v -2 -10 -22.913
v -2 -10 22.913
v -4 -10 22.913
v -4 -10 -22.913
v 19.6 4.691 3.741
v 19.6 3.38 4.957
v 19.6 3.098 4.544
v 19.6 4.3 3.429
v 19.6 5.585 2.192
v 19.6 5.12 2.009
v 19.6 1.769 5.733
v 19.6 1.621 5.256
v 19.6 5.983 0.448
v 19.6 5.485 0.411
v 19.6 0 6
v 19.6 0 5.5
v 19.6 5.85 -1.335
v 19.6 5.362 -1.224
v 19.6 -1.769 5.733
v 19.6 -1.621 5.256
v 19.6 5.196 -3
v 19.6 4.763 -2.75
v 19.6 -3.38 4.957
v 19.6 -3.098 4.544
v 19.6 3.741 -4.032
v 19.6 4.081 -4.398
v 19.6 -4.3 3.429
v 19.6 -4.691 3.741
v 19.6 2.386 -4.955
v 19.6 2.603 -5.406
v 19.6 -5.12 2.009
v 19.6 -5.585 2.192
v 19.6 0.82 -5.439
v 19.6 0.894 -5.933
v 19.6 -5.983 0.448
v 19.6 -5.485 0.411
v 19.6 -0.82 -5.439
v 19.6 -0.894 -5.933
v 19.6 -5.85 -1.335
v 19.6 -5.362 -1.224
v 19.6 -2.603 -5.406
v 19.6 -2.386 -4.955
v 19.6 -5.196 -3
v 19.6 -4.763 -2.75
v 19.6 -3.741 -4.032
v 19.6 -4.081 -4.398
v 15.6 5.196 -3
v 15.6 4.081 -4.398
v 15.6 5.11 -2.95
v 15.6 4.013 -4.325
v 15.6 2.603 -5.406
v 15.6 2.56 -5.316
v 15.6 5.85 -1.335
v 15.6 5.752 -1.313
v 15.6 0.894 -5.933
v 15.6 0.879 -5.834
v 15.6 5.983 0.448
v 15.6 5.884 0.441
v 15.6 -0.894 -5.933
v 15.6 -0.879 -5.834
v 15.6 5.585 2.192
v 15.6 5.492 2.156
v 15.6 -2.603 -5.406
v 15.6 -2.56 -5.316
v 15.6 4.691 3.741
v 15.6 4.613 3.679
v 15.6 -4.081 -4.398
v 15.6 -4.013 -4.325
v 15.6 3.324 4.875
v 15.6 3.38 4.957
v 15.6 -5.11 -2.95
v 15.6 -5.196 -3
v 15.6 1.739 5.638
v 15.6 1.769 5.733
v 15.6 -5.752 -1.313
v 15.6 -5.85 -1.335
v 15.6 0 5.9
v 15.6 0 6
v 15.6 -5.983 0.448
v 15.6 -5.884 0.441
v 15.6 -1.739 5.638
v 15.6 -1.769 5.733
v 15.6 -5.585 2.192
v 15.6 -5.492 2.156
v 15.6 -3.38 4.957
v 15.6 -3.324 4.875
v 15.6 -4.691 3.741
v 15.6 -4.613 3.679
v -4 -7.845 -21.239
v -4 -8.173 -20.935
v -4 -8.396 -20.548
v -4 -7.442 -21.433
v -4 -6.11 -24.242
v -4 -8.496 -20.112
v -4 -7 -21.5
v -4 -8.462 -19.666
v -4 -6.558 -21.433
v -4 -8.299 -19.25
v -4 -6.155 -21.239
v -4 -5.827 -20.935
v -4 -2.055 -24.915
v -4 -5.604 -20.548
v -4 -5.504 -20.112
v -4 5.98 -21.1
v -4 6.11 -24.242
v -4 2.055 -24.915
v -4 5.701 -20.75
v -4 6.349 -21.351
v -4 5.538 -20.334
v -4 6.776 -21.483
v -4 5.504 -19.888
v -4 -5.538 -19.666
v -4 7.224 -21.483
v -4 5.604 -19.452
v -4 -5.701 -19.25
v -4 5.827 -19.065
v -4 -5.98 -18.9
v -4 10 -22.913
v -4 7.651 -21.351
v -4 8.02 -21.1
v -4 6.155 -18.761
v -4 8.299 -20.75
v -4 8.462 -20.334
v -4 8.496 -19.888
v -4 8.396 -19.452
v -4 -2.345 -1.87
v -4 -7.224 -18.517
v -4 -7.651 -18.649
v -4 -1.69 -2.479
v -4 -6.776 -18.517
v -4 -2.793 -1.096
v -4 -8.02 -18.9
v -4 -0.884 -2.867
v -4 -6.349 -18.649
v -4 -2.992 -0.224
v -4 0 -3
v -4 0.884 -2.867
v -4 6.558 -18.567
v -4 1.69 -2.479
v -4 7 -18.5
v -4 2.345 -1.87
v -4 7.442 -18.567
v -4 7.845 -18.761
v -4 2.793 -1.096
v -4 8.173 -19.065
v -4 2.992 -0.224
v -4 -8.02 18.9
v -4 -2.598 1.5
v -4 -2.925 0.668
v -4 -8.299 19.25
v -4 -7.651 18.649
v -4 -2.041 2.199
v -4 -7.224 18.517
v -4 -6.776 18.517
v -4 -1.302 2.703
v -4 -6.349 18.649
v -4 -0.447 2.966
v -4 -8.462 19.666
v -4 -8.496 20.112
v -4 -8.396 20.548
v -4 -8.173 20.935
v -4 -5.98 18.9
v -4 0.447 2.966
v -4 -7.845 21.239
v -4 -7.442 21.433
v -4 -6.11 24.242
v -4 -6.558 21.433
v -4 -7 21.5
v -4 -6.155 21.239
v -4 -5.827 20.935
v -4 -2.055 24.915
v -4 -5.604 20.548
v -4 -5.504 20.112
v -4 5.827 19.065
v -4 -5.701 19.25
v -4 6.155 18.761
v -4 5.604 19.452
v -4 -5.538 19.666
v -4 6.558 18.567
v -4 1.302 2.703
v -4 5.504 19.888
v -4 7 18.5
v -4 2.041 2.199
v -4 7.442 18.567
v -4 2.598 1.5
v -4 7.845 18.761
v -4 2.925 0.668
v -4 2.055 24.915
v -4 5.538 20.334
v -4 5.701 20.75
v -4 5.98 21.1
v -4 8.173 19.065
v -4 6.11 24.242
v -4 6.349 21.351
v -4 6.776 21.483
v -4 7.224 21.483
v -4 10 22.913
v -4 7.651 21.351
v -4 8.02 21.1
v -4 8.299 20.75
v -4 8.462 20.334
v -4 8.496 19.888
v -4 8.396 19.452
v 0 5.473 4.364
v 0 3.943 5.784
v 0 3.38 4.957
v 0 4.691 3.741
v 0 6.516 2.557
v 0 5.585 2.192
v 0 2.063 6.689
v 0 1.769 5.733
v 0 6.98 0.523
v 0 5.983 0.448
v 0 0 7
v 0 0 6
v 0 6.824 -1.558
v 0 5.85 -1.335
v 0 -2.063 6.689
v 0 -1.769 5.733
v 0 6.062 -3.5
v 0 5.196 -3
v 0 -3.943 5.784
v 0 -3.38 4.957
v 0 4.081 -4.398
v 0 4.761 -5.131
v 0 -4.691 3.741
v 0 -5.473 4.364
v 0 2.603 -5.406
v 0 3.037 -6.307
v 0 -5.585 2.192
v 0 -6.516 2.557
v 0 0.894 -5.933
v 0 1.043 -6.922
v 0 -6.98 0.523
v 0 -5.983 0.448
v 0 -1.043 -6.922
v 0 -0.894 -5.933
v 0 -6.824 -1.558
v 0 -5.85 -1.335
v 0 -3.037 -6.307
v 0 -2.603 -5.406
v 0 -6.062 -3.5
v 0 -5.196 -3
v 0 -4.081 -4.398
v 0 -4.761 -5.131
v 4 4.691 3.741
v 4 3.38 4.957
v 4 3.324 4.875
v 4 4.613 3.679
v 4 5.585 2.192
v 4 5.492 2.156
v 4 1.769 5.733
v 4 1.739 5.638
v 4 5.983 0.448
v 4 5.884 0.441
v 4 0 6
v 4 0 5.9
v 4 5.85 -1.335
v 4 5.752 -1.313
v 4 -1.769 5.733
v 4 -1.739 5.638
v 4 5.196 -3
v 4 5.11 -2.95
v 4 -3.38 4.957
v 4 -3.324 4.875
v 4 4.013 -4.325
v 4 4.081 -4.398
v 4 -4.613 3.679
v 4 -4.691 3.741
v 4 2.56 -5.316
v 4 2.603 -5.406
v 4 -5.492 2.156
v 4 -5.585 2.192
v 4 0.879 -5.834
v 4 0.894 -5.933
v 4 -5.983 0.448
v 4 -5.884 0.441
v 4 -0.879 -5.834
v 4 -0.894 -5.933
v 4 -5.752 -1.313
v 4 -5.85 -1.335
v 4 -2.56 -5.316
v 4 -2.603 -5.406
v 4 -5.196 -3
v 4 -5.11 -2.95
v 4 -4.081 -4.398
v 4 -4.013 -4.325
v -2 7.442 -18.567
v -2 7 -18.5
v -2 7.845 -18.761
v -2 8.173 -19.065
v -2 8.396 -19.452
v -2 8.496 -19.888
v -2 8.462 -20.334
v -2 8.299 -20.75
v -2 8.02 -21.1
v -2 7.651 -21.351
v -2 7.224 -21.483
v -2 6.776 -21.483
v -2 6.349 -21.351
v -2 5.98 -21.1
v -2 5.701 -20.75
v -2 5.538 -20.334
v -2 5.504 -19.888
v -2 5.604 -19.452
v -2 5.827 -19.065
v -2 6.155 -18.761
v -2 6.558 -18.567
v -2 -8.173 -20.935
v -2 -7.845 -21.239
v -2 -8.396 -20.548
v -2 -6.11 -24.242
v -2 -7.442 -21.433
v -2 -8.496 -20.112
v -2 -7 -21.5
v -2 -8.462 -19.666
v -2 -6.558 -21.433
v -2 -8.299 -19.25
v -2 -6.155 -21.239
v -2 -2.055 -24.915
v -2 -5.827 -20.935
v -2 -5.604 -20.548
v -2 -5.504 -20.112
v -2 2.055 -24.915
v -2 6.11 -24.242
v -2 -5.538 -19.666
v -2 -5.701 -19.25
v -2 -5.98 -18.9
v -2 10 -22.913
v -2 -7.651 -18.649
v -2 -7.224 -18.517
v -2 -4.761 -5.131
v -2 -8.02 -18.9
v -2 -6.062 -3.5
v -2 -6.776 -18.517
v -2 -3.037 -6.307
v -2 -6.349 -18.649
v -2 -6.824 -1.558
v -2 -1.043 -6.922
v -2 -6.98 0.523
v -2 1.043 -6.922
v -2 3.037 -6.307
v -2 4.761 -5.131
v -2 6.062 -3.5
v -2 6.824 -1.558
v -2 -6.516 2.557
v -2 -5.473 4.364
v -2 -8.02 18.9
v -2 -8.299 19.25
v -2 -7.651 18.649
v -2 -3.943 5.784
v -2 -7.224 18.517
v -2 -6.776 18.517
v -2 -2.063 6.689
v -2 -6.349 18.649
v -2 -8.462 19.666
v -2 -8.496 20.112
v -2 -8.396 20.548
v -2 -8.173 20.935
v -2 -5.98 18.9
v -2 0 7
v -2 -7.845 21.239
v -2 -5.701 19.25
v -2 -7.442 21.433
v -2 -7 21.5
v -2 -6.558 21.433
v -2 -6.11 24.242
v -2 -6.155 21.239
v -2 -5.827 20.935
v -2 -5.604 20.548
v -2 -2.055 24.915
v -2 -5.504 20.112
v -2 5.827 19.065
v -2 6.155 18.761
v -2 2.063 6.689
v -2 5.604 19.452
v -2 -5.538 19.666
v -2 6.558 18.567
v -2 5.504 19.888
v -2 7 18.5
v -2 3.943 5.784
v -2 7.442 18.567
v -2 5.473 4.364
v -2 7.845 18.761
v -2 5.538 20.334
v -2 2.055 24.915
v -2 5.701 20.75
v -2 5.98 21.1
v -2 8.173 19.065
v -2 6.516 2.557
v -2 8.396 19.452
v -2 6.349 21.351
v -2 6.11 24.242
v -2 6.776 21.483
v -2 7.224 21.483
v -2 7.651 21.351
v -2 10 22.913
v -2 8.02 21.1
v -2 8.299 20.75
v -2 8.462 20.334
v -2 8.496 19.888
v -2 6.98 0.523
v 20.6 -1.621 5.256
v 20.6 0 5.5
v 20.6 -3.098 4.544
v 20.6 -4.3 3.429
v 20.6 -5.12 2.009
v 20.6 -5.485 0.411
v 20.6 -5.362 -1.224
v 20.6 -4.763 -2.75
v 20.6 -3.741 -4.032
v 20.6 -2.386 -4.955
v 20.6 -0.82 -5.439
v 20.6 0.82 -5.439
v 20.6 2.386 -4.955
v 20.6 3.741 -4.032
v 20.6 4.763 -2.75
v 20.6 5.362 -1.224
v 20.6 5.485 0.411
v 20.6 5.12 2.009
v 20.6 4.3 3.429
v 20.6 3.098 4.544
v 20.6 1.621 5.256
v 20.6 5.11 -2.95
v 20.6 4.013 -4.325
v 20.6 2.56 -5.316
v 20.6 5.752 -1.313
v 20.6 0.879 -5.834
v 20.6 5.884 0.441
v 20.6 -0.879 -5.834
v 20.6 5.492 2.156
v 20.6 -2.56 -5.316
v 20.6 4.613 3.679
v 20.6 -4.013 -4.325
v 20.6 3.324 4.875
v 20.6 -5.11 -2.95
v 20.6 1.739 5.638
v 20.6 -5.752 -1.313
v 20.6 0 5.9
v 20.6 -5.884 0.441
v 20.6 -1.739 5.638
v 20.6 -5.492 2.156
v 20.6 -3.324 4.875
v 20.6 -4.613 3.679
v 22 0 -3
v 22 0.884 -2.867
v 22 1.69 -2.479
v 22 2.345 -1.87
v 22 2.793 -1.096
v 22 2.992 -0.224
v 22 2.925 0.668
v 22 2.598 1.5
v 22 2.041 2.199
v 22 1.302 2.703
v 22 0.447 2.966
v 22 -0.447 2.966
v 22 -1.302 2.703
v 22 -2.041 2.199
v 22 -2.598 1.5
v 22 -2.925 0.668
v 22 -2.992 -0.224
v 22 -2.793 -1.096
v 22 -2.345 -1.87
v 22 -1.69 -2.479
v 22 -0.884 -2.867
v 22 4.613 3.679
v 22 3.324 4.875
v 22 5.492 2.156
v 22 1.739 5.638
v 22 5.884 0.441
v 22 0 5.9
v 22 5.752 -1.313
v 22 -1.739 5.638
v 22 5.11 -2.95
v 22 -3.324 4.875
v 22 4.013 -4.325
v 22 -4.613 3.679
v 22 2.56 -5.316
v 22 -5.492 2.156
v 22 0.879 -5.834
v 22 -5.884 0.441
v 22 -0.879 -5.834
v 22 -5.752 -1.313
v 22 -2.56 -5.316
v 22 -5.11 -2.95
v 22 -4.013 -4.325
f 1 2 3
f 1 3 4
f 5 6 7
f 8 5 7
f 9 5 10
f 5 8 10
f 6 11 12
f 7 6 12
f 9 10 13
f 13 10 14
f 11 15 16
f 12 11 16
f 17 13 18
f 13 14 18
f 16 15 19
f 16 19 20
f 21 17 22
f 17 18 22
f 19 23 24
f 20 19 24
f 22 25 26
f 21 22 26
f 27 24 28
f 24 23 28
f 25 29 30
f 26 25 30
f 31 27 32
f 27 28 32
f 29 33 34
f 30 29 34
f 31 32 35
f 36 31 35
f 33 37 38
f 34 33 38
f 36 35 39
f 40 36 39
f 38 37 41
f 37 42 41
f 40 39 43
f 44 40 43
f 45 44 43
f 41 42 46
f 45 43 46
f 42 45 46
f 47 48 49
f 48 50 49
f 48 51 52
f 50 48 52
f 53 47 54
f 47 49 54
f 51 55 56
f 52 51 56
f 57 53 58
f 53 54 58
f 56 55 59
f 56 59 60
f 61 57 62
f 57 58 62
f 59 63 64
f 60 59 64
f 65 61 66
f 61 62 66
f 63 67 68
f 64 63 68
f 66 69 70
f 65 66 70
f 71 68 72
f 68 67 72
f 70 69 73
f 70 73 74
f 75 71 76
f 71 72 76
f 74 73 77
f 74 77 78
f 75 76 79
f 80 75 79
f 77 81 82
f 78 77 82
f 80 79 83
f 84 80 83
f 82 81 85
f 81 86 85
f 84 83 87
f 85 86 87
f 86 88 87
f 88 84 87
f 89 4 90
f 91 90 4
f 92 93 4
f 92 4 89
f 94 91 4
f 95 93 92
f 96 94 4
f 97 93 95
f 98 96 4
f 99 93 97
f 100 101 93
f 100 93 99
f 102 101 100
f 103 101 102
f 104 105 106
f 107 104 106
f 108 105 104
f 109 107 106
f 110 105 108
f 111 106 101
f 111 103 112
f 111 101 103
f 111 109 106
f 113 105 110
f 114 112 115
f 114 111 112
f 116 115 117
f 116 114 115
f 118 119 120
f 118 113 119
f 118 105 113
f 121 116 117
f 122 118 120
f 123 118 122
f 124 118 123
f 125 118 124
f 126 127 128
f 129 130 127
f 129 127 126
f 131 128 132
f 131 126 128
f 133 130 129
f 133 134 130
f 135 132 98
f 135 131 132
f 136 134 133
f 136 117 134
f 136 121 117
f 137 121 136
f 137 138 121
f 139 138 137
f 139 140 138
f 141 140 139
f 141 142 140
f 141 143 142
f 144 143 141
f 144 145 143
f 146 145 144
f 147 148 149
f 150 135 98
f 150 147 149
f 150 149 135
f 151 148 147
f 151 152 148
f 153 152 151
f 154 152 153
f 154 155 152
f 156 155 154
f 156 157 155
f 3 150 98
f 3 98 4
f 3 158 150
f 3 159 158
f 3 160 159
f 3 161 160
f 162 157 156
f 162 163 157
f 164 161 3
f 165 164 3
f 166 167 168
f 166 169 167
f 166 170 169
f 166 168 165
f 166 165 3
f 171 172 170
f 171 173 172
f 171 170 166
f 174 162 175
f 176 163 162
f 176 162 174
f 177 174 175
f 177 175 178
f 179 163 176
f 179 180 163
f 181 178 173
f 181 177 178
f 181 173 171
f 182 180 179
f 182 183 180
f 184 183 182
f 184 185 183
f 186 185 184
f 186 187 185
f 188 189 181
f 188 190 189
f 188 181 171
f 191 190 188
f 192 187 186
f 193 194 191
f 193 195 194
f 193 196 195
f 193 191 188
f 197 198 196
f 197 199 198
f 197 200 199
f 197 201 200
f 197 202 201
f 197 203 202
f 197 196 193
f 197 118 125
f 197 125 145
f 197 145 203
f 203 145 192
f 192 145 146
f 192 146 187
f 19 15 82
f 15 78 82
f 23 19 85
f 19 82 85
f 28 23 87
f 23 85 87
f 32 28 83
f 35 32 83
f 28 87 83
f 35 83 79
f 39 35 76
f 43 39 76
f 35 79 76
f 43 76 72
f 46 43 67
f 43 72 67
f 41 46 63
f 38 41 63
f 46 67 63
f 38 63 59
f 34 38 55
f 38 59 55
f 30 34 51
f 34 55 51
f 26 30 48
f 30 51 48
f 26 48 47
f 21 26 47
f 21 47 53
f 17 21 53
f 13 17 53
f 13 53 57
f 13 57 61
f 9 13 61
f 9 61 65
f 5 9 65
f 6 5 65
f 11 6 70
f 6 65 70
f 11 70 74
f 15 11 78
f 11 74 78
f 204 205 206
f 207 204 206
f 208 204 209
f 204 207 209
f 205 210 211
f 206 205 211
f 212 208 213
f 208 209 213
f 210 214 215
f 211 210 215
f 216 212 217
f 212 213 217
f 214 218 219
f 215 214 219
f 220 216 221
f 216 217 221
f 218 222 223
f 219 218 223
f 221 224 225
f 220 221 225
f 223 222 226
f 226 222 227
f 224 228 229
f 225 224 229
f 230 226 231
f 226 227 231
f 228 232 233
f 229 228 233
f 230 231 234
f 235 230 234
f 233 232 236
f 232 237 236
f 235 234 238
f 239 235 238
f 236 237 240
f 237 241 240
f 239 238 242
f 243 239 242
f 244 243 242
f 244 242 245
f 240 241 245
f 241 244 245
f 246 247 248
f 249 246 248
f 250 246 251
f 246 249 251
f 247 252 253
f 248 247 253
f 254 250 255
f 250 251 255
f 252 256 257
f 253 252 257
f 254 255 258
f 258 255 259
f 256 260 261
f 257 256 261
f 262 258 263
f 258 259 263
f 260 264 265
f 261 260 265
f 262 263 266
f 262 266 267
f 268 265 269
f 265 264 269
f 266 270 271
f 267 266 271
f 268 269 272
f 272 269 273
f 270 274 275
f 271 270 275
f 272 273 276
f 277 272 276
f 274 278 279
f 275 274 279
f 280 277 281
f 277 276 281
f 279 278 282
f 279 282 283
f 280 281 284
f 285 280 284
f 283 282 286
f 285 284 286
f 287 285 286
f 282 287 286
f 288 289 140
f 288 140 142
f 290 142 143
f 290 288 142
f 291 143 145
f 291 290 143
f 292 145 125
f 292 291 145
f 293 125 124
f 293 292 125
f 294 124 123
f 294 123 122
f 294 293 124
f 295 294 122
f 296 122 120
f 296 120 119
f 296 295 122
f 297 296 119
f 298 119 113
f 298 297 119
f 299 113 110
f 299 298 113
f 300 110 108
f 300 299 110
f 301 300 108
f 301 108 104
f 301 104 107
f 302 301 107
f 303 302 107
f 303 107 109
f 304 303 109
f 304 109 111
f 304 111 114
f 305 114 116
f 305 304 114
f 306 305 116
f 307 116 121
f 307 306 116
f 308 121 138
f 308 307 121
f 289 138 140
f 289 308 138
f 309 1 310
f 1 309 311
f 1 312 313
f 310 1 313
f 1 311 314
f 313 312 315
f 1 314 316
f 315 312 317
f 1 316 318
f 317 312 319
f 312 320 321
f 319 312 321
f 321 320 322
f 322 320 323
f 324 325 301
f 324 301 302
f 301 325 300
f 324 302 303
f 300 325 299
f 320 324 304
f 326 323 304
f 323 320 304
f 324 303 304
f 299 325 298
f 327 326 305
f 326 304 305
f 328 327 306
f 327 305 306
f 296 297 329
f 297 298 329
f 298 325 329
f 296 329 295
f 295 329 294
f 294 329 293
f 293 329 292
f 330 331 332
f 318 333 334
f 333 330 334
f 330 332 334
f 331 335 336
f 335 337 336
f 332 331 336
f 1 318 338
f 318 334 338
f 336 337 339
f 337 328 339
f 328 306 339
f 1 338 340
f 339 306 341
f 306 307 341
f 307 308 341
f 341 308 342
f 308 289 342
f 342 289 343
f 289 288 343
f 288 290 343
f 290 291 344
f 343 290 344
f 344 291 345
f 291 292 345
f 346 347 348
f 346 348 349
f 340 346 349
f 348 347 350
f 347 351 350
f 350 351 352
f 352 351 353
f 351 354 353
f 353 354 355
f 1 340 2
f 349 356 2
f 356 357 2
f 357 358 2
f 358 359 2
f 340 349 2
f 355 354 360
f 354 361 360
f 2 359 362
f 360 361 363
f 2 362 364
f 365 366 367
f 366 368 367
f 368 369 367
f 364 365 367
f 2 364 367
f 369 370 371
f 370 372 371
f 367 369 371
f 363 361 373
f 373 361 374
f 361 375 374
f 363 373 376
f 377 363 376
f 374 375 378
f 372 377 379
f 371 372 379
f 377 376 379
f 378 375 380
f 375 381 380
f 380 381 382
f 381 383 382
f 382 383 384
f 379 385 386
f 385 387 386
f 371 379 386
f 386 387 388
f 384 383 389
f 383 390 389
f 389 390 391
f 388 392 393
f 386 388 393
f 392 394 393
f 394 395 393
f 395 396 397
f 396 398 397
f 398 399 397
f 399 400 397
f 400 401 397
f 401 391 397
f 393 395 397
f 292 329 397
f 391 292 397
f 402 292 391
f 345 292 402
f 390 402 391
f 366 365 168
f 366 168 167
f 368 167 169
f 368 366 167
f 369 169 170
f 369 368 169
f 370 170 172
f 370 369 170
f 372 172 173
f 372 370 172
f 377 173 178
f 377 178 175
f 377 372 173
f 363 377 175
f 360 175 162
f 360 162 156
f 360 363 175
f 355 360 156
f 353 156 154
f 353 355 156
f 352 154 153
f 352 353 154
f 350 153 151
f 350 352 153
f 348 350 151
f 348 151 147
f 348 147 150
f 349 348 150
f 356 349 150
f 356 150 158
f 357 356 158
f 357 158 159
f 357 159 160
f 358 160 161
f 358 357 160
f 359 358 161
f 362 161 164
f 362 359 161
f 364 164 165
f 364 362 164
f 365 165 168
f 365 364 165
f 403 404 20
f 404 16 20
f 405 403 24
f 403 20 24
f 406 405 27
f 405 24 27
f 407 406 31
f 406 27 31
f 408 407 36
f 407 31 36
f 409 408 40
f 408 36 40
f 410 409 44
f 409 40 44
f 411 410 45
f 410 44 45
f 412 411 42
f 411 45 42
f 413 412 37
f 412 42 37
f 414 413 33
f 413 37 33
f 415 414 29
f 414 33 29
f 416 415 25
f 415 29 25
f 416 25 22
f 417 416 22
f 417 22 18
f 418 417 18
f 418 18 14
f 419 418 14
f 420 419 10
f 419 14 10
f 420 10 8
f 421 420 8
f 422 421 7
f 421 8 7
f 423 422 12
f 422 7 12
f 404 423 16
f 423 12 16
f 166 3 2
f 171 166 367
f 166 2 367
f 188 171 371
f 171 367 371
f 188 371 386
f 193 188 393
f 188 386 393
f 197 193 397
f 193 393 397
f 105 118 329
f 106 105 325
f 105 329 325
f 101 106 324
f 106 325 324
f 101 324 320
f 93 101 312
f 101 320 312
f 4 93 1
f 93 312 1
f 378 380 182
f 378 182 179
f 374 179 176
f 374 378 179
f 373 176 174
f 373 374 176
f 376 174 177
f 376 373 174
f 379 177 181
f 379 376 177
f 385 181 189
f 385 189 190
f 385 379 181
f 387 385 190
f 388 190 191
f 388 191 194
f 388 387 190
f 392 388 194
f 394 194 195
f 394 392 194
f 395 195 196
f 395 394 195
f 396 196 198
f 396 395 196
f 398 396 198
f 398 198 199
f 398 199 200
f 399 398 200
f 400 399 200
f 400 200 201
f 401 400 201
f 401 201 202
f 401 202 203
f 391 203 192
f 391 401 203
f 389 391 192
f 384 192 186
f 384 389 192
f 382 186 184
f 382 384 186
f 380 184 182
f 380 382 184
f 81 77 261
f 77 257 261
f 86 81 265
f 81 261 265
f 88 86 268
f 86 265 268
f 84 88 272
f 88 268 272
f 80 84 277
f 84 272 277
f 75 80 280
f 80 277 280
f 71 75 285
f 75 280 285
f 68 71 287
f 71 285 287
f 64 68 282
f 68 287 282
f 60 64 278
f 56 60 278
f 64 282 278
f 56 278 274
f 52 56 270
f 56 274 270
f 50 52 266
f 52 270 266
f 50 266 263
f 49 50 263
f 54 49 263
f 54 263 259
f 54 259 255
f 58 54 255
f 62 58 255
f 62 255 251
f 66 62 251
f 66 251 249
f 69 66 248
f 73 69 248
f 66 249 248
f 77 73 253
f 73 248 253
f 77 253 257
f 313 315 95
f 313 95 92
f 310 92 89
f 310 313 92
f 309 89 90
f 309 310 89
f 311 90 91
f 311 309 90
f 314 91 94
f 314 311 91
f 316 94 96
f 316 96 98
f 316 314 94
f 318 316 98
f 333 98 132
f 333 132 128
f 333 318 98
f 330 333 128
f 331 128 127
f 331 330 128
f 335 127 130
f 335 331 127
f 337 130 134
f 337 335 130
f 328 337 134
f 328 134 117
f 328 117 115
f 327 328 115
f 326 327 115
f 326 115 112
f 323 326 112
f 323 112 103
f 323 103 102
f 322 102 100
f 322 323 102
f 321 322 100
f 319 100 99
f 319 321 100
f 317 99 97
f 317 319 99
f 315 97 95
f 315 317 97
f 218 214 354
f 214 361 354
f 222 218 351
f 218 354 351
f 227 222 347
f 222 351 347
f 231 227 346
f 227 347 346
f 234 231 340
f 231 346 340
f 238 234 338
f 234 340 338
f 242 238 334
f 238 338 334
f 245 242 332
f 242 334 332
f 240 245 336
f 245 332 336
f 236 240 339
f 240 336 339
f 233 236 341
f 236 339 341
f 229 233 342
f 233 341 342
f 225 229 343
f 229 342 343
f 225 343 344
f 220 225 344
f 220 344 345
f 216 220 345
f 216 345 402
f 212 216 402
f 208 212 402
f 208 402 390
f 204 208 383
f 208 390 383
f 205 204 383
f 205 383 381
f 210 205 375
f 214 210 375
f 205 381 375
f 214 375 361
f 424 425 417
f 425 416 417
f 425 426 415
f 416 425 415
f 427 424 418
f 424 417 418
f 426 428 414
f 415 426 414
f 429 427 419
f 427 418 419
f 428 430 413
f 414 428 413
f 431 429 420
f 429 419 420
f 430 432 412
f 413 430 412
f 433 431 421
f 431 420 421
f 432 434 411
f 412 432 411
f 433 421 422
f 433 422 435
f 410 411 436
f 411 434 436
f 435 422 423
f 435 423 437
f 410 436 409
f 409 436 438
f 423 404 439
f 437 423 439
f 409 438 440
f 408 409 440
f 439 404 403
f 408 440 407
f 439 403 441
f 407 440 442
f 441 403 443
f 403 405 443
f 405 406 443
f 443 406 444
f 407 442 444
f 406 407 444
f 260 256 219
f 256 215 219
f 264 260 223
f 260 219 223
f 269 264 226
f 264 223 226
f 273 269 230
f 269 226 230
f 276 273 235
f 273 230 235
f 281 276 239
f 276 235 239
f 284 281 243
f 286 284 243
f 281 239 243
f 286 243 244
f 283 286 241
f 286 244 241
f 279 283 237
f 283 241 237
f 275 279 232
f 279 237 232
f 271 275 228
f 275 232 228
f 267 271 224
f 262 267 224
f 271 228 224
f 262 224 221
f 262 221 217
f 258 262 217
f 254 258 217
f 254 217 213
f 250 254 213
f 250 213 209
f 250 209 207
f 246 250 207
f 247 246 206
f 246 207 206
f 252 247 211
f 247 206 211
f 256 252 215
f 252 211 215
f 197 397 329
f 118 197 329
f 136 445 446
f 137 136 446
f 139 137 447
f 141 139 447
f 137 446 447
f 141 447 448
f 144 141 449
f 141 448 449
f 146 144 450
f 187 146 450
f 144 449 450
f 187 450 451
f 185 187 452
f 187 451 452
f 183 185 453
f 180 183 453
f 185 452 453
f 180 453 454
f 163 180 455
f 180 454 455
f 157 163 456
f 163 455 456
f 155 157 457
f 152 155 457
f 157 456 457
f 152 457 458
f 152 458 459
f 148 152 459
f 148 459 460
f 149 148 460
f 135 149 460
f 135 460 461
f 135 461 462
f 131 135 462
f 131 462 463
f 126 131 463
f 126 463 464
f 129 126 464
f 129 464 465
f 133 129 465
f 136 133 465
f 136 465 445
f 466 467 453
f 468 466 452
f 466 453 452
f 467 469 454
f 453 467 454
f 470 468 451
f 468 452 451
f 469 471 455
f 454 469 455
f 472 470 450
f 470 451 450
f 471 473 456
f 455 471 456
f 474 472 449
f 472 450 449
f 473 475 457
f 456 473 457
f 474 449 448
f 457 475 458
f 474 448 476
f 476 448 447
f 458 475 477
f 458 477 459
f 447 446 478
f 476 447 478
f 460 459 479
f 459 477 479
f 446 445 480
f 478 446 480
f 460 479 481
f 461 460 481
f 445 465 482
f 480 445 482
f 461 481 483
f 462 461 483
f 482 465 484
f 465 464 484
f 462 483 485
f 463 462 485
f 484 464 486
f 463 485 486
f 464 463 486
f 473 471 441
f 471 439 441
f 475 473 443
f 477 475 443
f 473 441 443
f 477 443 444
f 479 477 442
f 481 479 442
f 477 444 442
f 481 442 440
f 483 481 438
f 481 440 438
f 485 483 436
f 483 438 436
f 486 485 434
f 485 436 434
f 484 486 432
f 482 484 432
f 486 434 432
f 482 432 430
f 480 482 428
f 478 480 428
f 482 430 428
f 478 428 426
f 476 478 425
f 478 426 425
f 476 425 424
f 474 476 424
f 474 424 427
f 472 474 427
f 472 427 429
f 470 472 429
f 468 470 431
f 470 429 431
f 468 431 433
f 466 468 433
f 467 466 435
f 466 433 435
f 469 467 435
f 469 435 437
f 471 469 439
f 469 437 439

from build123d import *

# Parameters (mm, degrees)
SKETCH_2_R            = 25
SKETCH_2_R_2          = 1.5
EXTRUDE_1_DEPTH       = 2
CUT_EXTRUDE_2_REACH   = 44.732
SKETCH_5_W            = 45.82575695
SKETCH_5_H            = 15
HOLE_WIZARD_6_0_6_1_D = 6


with BuildPart() as part:
    # 草图1 → 旋转2 (revolve)
    with BuildSketch(Plane.XY, mode=Mode.PRIVATE) as revolve_2_sk:
        Polygon((4, 6), (0, 6), (0, 7), (-2, 7), (-2, 0), (22, 0), (22, 3), (22, 5.9), (20.6, 5.9), (20.6, 5.5), (19.6, 5.5), (19.6, 6), (15.6, 6), (15.6, 5.9), (4, 5.9), align=None)
    revolve(revolve_2_sk.sketch.rotate(Axis((-38.40520389, 0, 0), (1, 0, 0)), 90), axis=Axis((-38.40520389, 0, 0), (1, 0, 0)))

    # 草图2 → 凸台-拉伸1 (add)
    with BuildSketch(Plane.ZY.offset(2)):
        Circle(SKETCH_2_R)
        with Locations((-20, 7)):
            Circle(SKETCH_2_R_2, mode=Mode.SUBTRACT)
        with Locations(Location((20, 7, 0), (0, 0, 180))):
            Circle(SKETCH_2_R_2, mode=Mode.SUBTRACT)
        with Locations((20, -7)):
            Circle(SKETCH_2_R_2, mode=Mode.SUBTRACT)
        with Locations(Location((-20, -7, 0), (0, 0, 180))):
            Circle(SKETCH_2_R_2, mode=Mode.SUBTRACT)
    extrude(amount=EXTRUDE_1_DEPTH)

    # 草图5 → 切除-拉伸2 (cut, up to next)
    with BuildSketch(Plane(origin=(-2, 0, 0), x_dir=(0, 0, -1), z_dir=(1, 0, 0)), mode=Mode.PRIVATE) as cut_extrude_2_sk1:
        with Locations((0, 17.5)):
            Rectangle(SKETCH_5_W, SKETCH_5_H)
    cut_extrude_2_tool1 = extrude(cut_extrude_2_sk1.sketch, amount=-CUT_EXTRUDE_2_REACH, mode=Mode.PRIVATE) & part.part
    cut_extrude_2 = cut_extrude_2_tool1.solids().sort_by_distance((-2, 17.5, 0))[0]
    add(cut_extrude_2, mode=Mode.SUBTRACT)

    # 镜向1: 切除-拉伸2 across plane
    add(cut_extrude_2.mirror(Plane.ZX), mode=Mode.SUBTRACT)

    # Ø6.0 (6) 直径孔1 (through all)
    with Locations(Plane.ZY.offset(4)):
        with Locations((0, 0)):
            Hole(HOLE_WIZARD_6_0_6_1_D / 2)


solid = part.part
